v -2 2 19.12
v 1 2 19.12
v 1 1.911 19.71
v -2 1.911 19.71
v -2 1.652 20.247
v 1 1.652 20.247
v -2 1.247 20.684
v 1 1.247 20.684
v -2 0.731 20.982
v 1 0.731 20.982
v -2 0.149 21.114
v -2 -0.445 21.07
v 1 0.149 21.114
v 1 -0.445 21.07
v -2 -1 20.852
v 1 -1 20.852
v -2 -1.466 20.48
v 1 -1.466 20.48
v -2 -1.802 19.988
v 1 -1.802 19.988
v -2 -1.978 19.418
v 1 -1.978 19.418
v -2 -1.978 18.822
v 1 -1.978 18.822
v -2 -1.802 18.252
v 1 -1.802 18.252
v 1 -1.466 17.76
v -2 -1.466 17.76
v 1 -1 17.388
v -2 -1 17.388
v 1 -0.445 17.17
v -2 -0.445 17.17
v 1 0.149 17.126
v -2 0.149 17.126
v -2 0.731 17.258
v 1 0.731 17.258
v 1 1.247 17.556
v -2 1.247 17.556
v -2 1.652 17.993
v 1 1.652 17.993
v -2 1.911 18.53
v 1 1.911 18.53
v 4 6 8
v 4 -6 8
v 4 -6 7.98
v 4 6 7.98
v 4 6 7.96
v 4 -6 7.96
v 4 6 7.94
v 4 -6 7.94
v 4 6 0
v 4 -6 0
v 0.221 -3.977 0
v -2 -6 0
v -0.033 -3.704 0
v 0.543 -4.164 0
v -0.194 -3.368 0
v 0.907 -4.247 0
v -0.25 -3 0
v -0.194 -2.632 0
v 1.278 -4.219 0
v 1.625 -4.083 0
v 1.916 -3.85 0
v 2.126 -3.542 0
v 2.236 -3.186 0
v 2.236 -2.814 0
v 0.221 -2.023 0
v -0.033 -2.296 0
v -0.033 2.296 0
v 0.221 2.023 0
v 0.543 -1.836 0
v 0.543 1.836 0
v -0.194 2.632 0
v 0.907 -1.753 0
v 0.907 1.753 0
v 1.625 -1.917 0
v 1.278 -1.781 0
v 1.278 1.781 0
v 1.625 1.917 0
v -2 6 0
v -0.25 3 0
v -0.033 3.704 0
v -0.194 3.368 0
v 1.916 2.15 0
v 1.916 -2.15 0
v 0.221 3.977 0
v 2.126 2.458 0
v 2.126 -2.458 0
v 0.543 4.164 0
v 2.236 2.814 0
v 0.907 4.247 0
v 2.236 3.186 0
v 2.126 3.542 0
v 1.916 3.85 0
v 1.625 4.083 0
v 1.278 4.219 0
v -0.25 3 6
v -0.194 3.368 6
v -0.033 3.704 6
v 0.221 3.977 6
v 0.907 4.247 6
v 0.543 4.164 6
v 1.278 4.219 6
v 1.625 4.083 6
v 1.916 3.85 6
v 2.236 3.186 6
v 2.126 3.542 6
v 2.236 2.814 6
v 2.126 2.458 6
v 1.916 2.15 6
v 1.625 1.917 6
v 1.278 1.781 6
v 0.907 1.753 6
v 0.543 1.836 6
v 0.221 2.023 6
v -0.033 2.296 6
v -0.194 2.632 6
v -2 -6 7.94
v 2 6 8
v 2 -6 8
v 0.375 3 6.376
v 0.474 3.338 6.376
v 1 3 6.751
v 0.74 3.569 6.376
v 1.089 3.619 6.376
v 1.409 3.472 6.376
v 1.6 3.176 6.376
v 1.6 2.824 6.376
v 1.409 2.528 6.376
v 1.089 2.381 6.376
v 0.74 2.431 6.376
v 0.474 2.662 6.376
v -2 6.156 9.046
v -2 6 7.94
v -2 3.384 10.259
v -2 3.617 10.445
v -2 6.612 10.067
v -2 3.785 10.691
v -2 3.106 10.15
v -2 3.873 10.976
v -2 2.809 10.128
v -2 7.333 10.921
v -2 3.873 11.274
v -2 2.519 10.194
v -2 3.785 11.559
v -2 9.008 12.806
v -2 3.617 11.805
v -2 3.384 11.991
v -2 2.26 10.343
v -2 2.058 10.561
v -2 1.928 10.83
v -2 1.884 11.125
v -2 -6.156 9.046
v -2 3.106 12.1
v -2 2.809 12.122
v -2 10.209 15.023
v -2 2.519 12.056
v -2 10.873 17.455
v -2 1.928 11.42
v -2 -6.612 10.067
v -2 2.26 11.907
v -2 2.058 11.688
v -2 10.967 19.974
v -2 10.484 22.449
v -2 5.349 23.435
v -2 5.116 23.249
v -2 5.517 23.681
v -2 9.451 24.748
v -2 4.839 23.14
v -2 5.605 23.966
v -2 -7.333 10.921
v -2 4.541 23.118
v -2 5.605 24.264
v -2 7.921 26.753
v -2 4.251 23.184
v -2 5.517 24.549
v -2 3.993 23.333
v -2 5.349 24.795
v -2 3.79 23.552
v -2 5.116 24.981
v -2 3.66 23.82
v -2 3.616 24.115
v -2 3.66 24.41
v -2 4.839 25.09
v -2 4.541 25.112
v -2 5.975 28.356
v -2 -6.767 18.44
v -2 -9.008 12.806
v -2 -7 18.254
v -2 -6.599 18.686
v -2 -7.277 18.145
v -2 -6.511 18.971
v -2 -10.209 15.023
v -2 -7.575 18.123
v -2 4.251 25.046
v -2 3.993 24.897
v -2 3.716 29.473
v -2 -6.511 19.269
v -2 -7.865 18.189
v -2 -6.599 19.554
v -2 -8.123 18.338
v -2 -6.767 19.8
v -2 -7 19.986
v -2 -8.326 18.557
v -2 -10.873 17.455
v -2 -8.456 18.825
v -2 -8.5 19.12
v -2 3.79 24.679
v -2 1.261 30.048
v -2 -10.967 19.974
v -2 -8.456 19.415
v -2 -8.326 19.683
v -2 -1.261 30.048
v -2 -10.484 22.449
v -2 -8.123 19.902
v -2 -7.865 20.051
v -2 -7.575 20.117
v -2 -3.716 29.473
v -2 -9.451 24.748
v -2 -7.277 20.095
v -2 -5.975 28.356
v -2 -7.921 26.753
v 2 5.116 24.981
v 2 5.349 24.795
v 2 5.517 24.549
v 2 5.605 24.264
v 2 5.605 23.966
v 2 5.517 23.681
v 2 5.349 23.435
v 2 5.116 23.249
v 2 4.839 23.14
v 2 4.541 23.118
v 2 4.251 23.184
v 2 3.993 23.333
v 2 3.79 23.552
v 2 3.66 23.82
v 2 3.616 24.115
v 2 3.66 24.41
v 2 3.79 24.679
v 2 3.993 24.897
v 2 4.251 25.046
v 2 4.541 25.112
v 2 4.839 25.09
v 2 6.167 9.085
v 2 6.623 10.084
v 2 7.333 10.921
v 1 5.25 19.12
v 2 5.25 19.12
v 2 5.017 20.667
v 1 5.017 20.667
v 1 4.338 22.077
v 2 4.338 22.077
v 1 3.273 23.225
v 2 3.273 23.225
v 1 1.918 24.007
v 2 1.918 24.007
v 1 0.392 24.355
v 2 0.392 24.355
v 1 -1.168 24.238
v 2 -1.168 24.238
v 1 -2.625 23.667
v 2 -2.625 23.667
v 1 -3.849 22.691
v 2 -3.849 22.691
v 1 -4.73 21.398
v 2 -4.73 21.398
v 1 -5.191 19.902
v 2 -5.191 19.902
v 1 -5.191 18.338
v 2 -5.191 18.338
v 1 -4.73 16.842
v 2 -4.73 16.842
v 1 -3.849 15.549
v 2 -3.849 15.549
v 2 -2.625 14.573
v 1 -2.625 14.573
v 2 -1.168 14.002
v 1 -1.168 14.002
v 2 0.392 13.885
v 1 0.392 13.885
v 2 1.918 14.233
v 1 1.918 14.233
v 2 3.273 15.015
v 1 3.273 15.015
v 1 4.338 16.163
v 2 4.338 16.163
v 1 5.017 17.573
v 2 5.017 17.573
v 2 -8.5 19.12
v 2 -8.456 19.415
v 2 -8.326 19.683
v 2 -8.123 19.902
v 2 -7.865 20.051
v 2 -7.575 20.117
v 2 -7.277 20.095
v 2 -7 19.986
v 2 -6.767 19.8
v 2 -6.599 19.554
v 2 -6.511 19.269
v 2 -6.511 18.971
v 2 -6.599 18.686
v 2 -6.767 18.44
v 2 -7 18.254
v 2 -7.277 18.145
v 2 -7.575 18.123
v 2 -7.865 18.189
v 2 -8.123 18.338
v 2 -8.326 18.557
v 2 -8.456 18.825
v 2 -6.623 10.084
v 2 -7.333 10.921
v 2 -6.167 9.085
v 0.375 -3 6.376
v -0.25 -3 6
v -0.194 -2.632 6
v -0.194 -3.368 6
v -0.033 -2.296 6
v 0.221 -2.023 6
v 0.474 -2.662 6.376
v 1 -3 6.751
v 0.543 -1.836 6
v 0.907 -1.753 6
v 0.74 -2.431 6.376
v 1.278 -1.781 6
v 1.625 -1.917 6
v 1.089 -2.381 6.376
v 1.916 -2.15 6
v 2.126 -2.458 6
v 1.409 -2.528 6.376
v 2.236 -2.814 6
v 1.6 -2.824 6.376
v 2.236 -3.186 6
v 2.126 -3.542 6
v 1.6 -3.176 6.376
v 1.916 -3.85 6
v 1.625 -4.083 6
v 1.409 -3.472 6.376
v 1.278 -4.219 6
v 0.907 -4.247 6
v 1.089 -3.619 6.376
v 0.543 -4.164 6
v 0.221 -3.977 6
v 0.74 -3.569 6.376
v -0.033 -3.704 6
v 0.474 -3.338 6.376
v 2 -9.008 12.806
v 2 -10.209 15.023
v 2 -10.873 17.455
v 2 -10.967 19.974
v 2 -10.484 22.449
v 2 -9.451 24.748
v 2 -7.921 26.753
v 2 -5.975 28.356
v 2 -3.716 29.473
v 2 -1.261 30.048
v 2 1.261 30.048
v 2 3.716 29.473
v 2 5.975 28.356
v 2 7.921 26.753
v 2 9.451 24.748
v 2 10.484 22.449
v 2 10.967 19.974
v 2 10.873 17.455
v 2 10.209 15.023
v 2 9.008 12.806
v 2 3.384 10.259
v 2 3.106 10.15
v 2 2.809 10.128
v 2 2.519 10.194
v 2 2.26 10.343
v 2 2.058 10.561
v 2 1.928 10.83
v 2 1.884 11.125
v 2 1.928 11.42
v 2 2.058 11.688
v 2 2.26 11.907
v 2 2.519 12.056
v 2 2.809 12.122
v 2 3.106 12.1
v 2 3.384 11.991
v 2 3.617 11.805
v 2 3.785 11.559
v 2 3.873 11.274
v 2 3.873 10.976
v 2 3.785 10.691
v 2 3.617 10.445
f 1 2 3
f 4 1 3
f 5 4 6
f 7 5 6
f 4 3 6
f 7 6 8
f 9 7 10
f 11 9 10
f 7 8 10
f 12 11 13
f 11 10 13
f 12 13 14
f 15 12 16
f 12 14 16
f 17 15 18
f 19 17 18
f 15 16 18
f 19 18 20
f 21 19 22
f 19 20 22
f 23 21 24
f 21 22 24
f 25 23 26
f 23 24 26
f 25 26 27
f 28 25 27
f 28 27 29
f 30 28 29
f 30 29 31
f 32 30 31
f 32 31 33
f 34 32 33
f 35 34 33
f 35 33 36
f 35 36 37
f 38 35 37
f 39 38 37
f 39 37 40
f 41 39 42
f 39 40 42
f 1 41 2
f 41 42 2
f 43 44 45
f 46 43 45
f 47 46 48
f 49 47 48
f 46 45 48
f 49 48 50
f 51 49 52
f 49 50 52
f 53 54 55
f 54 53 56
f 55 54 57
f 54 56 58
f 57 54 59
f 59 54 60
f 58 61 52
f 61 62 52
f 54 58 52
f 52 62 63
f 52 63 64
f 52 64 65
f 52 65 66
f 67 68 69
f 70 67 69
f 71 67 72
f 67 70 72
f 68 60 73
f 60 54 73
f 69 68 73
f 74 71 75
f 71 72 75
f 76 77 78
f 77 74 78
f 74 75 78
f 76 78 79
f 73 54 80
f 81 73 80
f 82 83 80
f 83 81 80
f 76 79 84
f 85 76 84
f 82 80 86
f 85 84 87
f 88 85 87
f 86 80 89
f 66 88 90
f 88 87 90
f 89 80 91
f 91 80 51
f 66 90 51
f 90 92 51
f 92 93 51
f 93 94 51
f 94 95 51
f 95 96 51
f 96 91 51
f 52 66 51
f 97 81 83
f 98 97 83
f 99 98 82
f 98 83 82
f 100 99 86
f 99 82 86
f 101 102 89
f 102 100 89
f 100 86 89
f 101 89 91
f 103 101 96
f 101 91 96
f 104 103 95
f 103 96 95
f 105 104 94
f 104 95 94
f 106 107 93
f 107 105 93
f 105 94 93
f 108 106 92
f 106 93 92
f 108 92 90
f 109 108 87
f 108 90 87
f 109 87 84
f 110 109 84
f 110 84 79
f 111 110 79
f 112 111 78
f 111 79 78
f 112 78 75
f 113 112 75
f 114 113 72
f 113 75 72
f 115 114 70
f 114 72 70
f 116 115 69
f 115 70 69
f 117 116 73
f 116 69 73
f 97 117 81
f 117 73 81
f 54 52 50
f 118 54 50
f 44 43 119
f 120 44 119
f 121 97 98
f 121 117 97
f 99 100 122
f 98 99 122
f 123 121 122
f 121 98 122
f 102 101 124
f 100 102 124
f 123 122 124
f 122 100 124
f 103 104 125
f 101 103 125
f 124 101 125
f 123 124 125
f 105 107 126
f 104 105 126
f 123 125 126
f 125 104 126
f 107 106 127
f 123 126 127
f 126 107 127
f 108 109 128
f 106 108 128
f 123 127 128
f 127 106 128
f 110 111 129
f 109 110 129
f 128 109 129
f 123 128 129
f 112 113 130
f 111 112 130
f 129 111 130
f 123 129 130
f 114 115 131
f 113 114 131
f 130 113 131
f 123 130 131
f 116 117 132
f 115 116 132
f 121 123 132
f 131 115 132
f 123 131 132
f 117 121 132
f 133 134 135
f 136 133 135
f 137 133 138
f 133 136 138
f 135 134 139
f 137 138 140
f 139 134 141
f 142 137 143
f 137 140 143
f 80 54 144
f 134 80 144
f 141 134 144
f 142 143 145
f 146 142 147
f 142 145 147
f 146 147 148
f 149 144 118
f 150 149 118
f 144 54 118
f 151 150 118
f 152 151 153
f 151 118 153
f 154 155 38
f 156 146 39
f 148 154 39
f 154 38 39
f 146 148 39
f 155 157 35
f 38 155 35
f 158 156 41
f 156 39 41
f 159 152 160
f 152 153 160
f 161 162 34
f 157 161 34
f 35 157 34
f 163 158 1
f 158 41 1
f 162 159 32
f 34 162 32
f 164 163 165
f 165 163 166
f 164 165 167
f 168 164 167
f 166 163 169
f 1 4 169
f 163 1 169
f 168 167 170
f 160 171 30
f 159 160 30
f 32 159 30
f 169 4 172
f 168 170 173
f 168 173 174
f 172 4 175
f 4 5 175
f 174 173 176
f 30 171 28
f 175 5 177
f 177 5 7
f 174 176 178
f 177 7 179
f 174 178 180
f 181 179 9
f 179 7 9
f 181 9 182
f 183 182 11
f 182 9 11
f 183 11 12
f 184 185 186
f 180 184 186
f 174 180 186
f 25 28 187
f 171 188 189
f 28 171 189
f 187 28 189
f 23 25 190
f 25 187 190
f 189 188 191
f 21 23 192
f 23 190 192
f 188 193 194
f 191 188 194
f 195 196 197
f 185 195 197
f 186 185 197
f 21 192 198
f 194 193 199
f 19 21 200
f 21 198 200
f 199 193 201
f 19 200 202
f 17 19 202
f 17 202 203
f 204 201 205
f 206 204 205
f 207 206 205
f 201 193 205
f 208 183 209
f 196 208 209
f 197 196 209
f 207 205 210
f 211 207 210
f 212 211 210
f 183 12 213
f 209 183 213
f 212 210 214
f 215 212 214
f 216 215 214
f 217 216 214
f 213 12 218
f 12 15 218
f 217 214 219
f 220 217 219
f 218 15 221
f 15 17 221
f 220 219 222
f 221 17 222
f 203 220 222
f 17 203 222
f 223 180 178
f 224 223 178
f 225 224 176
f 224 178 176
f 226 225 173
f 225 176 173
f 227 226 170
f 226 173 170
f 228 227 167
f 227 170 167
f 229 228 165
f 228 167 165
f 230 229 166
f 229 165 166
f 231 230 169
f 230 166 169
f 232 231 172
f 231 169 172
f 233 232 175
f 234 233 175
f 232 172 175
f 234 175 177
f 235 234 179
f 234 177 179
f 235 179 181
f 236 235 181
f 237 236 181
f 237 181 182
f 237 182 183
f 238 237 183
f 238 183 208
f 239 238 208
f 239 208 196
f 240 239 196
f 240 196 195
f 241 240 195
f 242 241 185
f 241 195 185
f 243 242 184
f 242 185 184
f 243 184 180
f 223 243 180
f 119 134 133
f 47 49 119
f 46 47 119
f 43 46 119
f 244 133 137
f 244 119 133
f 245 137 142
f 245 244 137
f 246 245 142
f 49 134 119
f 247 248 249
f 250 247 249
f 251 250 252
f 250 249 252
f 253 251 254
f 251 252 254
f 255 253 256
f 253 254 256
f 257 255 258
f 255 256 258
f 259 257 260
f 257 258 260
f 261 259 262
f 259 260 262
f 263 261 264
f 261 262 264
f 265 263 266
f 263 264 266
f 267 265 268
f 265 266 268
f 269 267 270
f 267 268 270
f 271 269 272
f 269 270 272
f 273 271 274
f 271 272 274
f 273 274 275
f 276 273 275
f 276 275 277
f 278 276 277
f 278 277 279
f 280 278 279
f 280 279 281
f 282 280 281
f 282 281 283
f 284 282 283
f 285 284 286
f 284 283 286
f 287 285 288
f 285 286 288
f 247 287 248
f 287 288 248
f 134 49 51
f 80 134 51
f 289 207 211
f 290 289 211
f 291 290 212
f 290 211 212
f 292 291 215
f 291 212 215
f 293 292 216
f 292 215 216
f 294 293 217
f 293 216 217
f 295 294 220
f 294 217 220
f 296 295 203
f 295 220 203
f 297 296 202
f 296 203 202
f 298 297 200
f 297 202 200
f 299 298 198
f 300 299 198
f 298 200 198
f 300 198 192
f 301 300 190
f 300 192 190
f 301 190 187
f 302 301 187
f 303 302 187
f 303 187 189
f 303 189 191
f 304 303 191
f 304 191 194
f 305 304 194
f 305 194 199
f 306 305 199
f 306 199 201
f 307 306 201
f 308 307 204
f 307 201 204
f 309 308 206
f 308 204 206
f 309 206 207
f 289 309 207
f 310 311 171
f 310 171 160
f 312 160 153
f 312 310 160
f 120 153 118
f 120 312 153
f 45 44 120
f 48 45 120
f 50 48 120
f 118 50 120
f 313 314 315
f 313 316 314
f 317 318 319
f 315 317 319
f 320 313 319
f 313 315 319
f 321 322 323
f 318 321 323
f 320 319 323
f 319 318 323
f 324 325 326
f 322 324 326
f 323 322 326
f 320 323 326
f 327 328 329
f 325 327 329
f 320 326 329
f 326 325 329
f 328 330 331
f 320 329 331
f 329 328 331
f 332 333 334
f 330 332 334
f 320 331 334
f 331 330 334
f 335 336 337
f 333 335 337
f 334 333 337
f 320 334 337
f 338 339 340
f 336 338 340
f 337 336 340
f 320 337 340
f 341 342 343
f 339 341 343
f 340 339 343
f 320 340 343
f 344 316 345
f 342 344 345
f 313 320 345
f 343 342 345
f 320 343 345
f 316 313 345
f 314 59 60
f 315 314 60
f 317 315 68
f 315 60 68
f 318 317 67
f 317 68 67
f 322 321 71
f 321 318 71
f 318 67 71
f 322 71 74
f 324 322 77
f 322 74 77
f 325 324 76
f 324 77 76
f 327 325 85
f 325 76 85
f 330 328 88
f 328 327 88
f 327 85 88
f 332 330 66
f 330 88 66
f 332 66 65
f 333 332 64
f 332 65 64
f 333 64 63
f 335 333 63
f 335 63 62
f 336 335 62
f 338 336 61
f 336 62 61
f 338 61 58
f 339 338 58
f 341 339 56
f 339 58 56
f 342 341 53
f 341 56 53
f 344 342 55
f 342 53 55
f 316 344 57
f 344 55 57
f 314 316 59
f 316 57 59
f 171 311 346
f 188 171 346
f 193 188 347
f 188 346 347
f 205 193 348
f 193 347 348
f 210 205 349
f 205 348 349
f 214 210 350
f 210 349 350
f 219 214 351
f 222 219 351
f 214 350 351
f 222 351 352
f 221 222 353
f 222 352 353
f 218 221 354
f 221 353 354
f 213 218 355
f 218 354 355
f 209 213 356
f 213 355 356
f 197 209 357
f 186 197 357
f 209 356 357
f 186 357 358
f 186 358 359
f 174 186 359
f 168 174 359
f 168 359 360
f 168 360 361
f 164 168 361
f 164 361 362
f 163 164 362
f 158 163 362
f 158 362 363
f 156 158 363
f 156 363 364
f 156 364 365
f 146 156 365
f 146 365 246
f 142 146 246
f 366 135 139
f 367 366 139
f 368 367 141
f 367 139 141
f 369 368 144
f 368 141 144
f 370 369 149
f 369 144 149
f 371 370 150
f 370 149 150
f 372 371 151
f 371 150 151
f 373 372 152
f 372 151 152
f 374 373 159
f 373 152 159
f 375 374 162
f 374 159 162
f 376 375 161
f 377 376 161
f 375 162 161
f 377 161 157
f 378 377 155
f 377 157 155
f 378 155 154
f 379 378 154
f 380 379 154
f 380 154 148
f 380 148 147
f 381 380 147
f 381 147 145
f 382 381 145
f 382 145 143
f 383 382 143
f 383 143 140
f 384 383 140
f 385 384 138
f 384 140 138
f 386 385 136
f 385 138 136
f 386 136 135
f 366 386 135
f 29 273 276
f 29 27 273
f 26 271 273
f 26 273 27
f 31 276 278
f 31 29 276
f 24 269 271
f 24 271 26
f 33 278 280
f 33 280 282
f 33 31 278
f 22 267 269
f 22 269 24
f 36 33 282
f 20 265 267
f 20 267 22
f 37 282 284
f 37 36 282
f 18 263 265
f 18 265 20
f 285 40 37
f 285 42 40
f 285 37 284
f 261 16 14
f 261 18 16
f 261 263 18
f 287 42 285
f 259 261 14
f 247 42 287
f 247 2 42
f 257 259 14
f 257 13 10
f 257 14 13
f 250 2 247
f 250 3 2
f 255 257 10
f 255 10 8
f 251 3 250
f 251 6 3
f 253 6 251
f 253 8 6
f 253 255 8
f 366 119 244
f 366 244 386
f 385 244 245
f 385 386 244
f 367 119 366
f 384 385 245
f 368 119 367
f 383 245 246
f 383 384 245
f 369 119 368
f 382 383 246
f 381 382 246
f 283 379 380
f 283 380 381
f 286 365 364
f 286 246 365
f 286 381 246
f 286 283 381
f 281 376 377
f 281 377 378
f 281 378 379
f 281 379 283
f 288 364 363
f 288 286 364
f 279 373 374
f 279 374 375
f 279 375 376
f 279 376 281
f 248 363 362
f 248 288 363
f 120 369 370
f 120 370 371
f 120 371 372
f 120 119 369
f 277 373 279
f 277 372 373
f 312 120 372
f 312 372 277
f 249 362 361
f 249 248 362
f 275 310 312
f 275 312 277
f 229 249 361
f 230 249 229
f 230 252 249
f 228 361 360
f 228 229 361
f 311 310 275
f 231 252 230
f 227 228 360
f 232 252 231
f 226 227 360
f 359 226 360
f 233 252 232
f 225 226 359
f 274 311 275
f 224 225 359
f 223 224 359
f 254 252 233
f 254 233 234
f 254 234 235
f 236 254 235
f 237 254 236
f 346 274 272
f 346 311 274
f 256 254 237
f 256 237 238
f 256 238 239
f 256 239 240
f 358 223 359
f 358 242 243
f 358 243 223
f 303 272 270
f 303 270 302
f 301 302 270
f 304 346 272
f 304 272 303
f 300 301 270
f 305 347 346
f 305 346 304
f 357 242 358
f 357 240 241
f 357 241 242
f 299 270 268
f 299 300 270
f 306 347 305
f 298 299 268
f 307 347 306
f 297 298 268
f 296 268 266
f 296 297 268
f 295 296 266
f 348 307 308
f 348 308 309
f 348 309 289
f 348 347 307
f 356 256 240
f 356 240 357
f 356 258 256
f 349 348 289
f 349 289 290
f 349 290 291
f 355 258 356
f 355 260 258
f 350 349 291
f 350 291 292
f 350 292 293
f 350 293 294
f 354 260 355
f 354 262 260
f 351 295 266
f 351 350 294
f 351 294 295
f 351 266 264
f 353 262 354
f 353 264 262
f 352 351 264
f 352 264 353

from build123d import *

# Parameters (mm, degrees)
SKETCH1_W             = 6
SKETCH1_H             = 12
EXTRUDE1_DEPTH        = 8
SKETCH3_W             = 4
SKETCH3_H             = 8.6
EXTRUDE2_DEPTH        = 1
SKETCH2_R             = 1.25
EXTRUDE3_DEPTH        = 6
EXTRUDE4_DEPTH        = 4
SKETCH8_R             = 5.25
EXTRUDE7_DEPTH        = 1
SKETCH7_R             = 1
EXTRUDE6_DEPTH        = 4
CIRPATTERN1_COUNT     = 3
SKETCH9_R             = 2
EXTRUDE8_DEPTH        = 3
M3_TAPPED_HOLE1_D     = 2.5
M3_TAPPED_HOLE1_DEPTH = 6
M3_TAPPED_HOLE1_TIP   = 0.751075774
FILLET1_R             = 4


with BuildPart() as part:
    # Sketch1 → Extrude1 (new body)
    with BuildSketch(Plane.XY):
        with Locations((1, 0)):
            Rectangle(SKETCH1_W, SKETCH1_H)
    extrude(amount=EXTRUDE1_DEPTH)

    # Sketch3 → Extrude2 (add)
    with BuildSketch(Plane.XY.offset(8)):
        Rectangle(SKETCH3_W, SKETCH3_H)
    extrude(amount=EXTRUDE2_DEPTH)

    # Sketch2 → Extrude3 (cut)
    with BuildSketch(Plane(origin=(0, 0, 0), x_dir=(-1, 0, 0), z_dir=(0, 0, -1))):
        with Locations((-1, 3)):
            Circle(SKETCH2_R)
        with Locations((-1, -3)):
            Circle(SKETCH2_R)
    extrude(amount=-EXTRUDE3_DEPTH, mode=Mode.SUBTRACT)

    # Sketch4 → Extrude4 (add)
    with BuildSketch(Plane(origin=(2, 0, 0), x_dir=(0, 0, -1), z_dir=(1, 0, 0))):
        with BuildLine():
            Line((-9.900455543, 6), (-8, 6))
            Line((-8, 6), (-8, -6))
            Line((-8, -6), (-9.900455543, -6))
            ThreePointArc((-9.900455543, -6), (-30.12, 0), (-9.900455543, 6))
        make_face()
    extrude(amount=-EXTRUDE4_DEPTH)

    # Sketch8 → Extrude7 (cut)
    with BuildSketch(Plane(origin=(2, 0, 0), x_dir=(0, 0, -1), z_dir=(1, 0, 0))):
        with Locations(Location((-19.12, 0, 0), (0, 0, 90))):
            Circle(SKETCH8_R)
    extrude(amount=-EXTRUDE7_DEPTH, mode=Mode.SUBTRACT)

    # Sketch7 → Extrude6 (cut)
    with BuildSketch(Plane.ZY.offset(2)):
        with Locations(Location((19.12, -7.5, 0), (0, 0, 270))):
            Circle(SKETCH7_R)
    extrude6 = extrude(amount=-EXTRUDE6_DEPTH, mode=Mode.SUBTRACT)

    # CirPattern1: Extrude6 ×3 about axis
    cirpattern1_axis = Axis((0, 0, 18.12), (1, 0, 0))
    for i in range(1, CIRPATTERN1_COUNT):
        add(extrude6.rotate(cirpattern1_axis, i * 360 / CIRPATTERN1_COUNT), mode=Mode.SUBTRACT)

    # Sketch9 → Extrude8 (cut)
    with BuildSketch(Plane(origin=(1, 0, 0), x_dir=(0, 0, -1), z_dir=(1, 0, 0))):
        with Locations(Location((-19.12, 0, 0), (0, 0, 90))):
            Circle(SKETCH9_R)
    extrude(amount=-EXTRUDE8_DEPTH, mode=Mode.SUBTRACT)

    # M3 Tapped Hole1
    with Locations(Plane(origin=(1, 3, 0), x_dir=(-1, 0, 0), z_dir=(0, 0, -1))):
        with Locations((0, 0), (0, -6)):
            Hole(M3_TAPPED_HOLE1_D / 2, depth=M3_TAPPED_HOLE1_DEPTH)
            with Locations((0, 0, -(M3_TAPPED_HOLE1_DEPTH + M3_TAPPED_HOLE1_TIP / 2))):  # 118° drill point
                Cone(0, M3_TAPPED_HOLE1_D / 2, M3_TAPPED_HOLE1_TIP, mode=Mode.SUBTRACT)

    # Fillet1
    # the kernel refuses this fillet: 4 mm, written as the material it adds along each edge
    with BuildSketch(Plane(origin=(6.901988576, -6, 9.900455543), x_dir=(0, 0, -1), z_dir=(-1, 0, 0))) as fillet1_piece_1_section:
        with BuildLine():
            CenterArc((1.96079543, 4), FILLET1_R, 221.810314896, 48.189685104)
            ThreePointArc((-1.02062854, 1.333333333), (-0.484835824, 0.686169688), (0, 0))
            Line((0, 0), (1.96079543, 0))
        make_face()
    fillet1_piece_1 = extrude(amount=8.901988576, mode=Mode.PRIVATE)
    fillet1_piece_1 = split(fillet1_piece_1, bisect_by=Plane(origin=(4, -5.96007597, 7.969858609), z_dir=(-1, 0, 0)), keep=Keep.TOP, mode=Mode.PRIVATE)
    fillet1_piece_1 = split(fillet1_piece_1, bisect_by=Plane(origin=(3, -5.96007597, 8), z_dir=(0, 0, -1)), keep=Keep.TOP, mode=Mode.PRIVATE)
    fillet1_piece_1 = split(fillet1_piece_1, bisect_by=Plane(origin=(2, -5.96007597, 7.969858609), z_dir=(1, 0, 0)), keep=Keep.TOP, mode=Mode.PRIVATE)
    add(fillet1_piece_1)
    with BuildSketch(Plane(origin=(2, -6, 9.900455543), x_dir=(0, 0, -1), z_dir=(-1, 0, 0))) as fillet1_piece_2_section:
        with BuildLine():
            CenterArc((1.96079543, 4), FILLET1_R, 221.810314896, 48.189685104)
            ThreePointArc((-1.02062854, 1.333333333), (-0.484835824, 0.686169688), (0, 0))
            Line((0, 0), (1.96079543, 0))
        make_face()
    fillet1_piece_2 = extrude(amount=4, mode=Mode.PRIVATE)
    fillet1_piece_2 = split(fillet1_piece_2, bisect_by=Plane(origin=(0, -5.96007597, 8), z_dir=(0, 0, -1)), keep=Keep.TOP, mode=Mode.PRIVATE)
    add(fillet1_piece_2)
    with BuildSketch(Plane(origin=(2, -6, 9.900455543), x_dir=(0, 0, -1), z_dir=(-1, 0, 0))) as fillet1_piece_3_section:
        with BuildLine():
            CenterArc((1.96079543, 4), FILLET1_R, 221.810314896, 48.189685104)
            ThreePointArc((-1.02062854, 1.333333333), (-0.484835824, 0.686169688), (0, 0))
            Line((0, 0), (1.96079543, 0))
        make_face()
    fillet1_piece_3 = extrude(amount=4, mode=Mode.PRIVATE)
    fillet1_piece_3 = split(fillet1_piece_3, bisect_by=Plane(origin=(0, -6.284176822, 8), z_dir=(0, 0, 1)), keep=Keep.TOP, mode=Mode.PRIVATE)
    add(fillet1_piece_3)
    with BuildSketch(Plane(origin=(6.901988576, 6, 9.900455543), x_dir=(0, 0, -1), z_dir=(-1, 0, 0))) as fillet1_piece_4_section:
        with BuildLine():
            CenterArc((1.96079543, -4), FILLET1_R, 90, 48.189685104)
            ThreePointArc((-1.02062854, -1.333333333), (-0.484835824, -0.686169688), (0, 0))
            Line((0, 0), (1.96079543, 0))
        make_face()
    fillet1_piece_4 = extrude(amount=8.901988576, mode=Mode.PRIVATE)
    fillet1_piece_4 = split(fillet1_piece_4, bisect_by=Plane(origin=(2, 5.96007597, 7.969858609), z_dir=(1, 0, 0)), keep=Keep.TOP, mode=Mode.PRIVATE)
    fillet1_piece_4 = split(fillet1_piece_4, bisect_by=Plane(origin=(3, 5.96007597, 8), z_dir=(0, 0, -1)), keep=Keep.TOP, mode=Mode.PRIVATE)
    fillet1_piece_4 = split(fillet1_piece_4, bisect_by=Plane(origin=(4, 5.96007597, 7.969858609), z_dir=(-1, 0, 0)), keep=Keep.TOP, mode=Mode.PRIVATE)
    add(fillet1_piece_4)
    with BuildSketch(Plane(origin=(2, 6, 9.900455543), x_dir=(0, 0, -1), z_dir=(-1, 0, 0))) as fillet1_piece_5_section:
        with BuildLine():
            CenterArc((1.96079543, -4), FILLET1_R, 90, 48.189685104)
            ThreePointArc((-1.02062854, -1.333333333), (-0.484835824, -0.686169688), (0, 0))
            Line((0, 0), (1.96079543, 0))
        make_face()
    fillet1_piece_5 = extrude(amount=4, mode=Mode.PRIVATE)
    fillet1_piece_5 = split(fillet1_piece_5, bisect_by=Plane(origin=(0, 5.96007597, 8), z_dir=(0, 0, -1)), keep=Keep.TOP, mode=Mode.PRIVATE)
    add(fillet1_piece_5)
    with BuildSketch(Plane(origin=(2, 6, 9.900455543), x_dir=(0, 0, -1), z_dir=(-1, 0, 0))) as fillet1_piece_6_section:
        with BuildLine():
            CenterArc((1.96079543, -4), FILLET1_R, 90, 48.189685104)
            ThreePointArc((-1.02062854, -1.333333333), (-0.484835824, -0.686169688), (0, 0))
            Line((0, 0), (1.96079543, 0))
        make_face()
    fillet1_piece_6 = extrude(amount=4, mode=Mode.PRIVATE)
    fillet1_piece_6 = split(fillet1_piece_6, bisect_by=Plane(origin=(0, 6.284176822, 8), z_dir=(0, 0, 1)), keep=Keep.TOP, mode=Mode.PRIVATE)
    add(fillet1_piece_6)


solid = part.part
